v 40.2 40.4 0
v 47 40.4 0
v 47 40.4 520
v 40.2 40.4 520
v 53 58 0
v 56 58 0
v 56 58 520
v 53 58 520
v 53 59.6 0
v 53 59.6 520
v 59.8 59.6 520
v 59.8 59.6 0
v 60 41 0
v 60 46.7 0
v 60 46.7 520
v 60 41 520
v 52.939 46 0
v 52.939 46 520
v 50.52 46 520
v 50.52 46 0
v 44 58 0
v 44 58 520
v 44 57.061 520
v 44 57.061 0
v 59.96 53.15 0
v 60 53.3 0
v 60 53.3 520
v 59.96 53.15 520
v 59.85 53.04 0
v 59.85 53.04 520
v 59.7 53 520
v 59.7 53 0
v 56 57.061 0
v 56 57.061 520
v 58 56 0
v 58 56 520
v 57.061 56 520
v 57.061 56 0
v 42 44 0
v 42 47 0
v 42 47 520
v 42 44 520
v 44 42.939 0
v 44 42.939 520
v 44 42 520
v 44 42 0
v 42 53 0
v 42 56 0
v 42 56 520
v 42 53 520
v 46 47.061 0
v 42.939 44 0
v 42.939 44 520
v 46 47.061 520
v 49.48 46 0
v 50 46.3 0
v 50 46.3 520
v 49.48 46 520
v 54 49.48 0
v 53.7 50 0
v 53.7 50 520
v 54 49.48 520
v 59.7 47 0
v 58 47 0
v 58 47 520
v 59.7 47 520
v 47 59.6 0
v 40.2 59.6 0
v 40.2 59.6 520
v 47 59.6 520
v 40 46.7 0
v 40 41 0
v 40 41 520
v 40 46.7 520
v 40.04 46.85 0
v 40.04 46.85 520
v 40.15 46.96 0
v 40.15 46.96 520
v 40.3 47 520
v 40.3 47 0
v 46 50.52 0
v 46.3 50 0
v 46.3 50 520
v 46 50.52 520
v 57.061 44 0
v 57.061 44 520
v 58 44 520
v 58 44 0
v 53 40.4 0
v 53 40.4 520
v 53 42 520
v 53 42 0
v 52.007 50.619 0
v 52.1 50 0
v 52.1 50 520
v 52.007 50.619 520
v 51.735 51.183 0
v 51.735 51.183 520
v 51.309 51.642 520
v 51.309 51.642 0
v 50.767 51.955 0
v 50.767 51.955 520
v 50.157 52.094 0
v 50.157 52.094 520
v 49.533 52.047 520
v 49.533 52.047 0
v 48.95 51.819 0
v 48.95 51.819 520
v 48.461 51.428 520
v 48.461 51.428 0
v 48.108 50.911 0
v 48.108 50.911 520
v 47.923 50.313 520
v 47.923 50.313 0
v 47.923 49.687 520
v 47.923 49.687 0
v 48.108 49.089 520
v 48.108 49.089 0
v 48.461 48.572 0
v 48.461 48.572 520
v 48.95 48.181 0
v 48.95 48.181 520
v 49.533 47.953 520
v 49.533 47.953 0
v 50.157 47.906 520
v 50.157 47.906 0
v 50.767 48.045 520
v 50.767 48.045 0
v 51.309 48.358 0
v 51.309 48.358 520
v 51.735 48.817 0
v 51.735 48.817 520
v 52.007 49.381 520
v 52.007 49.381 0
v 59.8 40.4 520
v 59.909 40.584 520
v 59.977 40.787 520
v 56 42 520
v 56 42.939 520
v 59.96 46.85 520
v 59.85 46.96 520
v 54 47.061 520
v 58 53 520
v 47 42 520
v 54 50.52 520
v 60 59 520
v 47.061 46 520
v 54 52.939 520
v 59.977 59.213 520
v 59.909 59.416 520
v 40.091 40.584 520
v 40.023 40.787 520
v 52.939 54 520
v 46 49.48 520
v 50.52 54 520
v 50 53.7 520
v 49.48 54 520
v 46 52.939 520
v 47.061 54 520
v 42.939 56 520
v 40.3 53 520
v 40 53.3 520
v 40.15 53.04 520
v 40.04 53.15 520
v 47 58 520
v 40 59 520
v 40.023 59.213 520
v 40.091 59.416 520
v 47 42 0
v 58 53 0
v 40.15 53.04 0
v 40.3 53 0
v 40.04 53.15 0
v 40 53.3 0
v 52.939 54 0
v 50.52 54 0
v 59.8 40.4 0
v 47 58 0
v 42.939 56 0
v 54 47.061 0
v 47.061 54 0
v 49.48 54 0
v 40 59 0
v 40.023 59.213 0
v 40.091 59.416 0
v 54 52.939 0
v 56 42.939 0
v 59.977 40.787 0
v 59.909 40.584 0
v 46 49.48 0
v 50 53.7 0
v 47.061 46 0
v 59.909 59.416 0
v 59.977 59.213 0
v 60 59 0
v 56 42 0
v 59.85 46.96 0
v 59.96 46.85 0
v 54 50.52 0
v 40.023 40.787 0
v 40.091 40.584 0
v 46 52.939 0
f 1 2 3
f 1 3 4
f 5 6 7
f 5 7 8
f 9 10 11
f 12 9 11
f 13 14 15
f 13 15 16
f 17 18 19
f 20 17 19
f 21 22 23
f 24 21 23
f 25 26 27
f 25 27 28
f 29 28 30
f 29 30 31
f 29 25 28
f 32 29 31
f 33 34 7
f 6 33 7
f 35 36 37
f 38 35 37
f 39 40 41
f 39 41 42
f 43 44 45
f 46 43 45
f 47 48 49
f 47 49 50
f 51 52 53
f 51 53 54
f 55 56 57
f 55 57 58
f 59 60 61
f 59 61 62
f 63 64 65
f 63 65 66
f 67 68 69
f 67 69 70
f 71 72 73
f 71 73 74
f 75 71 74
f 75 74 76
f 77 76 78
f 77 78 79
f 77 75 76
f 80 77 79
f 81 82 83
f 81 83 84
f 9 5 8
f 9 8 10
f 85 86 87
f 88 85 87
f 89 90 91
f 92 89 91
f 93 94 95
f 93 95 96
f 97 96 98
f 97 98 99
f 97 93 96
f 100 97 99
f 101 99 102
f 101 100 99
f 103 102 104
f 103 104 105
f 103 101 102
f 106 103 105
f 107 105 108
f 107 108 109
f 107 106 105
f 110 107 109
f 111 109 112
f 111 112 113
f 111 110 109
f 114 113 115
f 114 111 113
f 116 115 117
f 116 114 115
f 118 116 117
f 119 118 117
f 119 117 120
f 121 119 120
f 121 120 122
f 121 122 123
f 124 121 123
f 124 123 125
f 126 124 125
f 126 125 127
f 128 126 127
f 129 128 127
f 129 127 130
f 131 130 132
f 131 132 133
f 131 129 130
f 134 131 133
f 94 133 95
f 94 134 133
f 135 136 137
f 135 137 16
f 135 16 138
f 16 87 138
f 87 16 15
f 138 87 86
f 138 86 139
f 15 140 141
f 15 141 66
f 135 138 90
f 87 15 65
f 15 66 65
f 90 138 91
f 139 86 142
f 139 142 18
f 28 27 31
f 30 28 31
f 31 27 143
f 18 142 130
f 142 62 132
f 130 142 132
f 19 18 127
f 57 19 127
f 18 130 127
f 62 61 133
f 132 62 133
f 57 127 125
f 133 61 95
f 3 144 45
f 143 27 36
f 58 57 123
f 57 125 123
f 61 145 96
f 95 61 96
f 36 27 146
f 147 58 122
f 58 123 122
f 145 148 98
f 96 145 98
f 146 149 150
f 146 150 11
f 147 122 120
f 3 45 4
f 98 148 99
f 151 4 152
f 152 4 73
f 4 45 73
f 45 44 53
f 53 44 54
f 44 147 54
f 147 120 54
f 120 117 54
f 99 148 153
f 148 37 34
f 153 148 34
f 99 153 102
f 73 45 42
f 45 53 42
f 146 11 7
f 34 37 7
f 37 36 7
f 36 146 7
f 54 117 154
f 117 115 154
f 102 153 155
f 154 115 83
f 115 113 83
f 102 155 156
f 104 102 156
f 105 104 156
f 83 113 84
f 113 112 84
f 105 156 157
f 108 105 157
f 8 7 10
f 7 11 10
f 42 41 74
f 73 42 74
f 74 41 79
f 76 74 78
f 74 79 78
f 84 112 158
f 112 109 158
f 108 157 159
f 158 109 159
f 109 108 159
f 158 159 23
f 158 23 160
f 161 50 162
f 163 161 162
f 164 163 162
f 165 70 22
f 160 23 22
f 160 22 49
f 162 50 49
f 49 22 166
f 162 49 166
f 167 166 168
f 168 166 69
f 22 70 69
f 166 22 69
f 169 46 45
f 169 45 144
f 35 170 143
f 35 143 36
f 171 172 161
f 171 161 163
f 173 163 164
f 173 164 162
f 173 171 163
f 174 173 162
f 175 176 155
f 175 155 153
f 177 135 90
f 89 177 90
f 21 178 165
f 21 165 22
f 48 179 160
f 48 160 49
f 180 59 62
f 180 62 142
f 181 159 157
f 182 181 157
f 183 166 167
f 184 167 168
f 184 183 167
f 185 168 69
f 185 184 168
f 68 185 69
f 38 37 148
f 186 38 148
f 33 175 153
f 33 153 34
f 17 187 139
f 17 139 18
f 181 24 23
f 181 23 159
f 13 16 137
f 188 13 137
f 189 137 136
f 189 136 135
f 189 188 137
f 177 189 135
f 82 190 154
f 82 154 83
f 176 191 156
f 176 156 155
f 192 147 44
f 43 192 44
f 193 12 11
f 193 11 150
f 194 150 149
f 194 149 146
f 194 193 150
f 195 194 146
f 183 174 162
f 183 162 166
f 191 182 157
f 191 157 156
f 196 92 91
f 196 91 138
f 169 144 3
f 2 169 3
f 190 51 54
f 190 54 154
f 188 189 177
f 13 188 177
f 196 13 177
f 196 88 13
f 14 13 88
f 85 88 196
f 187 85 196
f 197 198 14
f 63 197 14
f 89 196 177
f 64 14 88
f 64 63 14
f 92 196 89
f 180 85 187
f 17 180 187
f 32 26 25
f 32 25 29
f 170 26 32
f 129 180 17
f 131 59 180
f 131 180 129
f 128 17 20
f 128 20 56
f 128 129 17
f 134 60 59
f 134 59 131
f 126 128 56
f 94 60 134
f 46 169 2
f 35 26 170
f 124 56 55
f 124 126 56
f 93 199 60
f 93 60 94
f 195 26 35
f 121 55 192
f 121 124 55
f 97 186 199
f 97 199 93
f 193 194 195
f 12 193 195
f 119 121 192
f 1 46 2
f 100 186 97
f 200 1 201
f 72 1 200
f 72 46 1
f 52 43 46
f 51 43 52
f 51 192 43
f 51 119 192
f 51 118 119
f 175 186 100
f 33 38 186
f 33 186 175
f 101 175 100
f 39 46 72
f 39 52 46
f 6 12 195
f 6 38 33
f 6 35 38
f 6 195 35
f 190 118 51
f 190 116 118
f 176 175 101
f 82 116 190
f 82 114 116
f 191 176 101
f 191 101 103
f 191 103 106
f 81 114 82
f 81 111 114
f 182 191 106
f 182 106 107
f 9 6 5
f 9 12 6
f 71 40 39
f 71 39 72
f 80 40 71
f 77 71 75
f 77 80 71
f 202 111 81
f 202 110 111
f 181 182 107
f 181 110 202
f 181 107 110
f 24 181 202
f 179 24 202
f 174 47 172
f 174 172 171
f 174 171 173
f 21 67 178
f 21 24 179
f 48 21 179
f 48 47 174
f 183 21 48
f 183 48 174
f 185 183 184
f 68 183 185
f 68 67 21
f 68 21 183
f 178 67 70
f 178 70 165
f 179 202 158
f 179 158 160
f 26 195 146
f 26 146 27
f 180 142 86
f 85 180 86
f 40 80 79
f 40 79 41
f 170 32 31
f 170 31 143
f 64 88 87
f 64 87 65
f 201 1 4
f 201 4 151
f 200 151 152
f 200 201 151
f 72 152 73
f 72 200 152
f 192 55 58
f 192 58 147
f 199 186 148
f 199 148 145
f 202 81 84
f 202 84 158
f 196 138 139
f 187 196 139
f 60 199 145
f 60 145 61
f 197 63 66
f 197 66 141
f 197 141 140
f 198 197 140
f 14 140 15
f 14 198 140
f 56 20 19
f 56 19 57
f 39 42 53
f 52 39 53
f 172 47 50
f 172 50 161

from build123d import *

# Parameters (mm, degrees)
SKETCH_3_R      = 2.0999999
EXTRUDE_1_DEPTH = 520


with BuildPart() as part:
    # 草图3 → 凸台-拉伸1 (new body)
    with BuildSketch(Plane.XY):
        with BuildLine():
            Line((57.060659494, 56.000000011), (54.000002413, 52.939342929))
            Line((54.000002413, 52.939342929), (54.000002413, 50.519633796))
            Line((54.000002413, 50.519633796), (53.700020897, 50.000006546))
            Line((53.700020897, 50.000006546), (54.000002413, 49.480359881))
            Line((54.000002413, 49.480359881), (54.000002413, 47.060657071))
            Line((54.000002413, 47.060657071), (57.060659494, 43.999999989))
            Line((57.060659494, 43.999999989), (57.999999993, 43.999999989))
            Line((57.999999993, 43.999999989), (57.999999993, 46.999999994))
            Line((57.999999993, 46.999999994), (59.699999997, 46.999999994))
            ThreePointArc((59.699999997, 46.999999994), (59.912132029, 46.912132029), (59.999999993, 46.699999998))
            Line((59.999999993, 46.699999998), (59.999999993, 41))
            ThreePointArc((59.999999993, 41), (59.948683291, 40.683772234), (59.799999994, 40.400000001))
            Line((59.799999994, 40.400000001), (52.999999994, 40.400000001))
            Line((52.999999994, 40.400000001), (52.999999994, 42))
            Line((52.999999994, 42), (55.999999999, 42))
            Line((55.999999999, 42), (55.999999999, 42.939340499))
            Line((55.999999999, 42.939340499), (52.939327623, 45.999997582))
            Line((52.939327623, 45.999997582), (50.519608524, 45.999997582))
            Line((50.519608524, 45.999997582), (49.99999391, 46.300000984))
            Line((49.99999391, 46.300000984), (49.48035988, 45.999997582))
            Line((49.48035988, 45.999997582), (47.06065707, 45.999997582))
            Line((47.06065707, 45.999997582), (43.99999999, 42.939340499))
            Line((43.99999999, 42.939340499), (43.99999999, 42))
            Line((43.99999999, 42), (46.999999994, 42))
            Line((46.999999994, 42), (46.999999994, 40.400000001))
            Line((46.999999994, 40.400000001), (40.199999995, 40.400000001))
            ThreePointArc((40.199999995, 40.400000001), (40.051316697, 40.683772234), (39.999999996, 41))
            Line((39.999999996, 41), (39.999999996, 46.699999998))
            ThreePointArc((39.999999996, 46.699999998), (40.08786796, 46.912132029), (40.299999991, 46.999999994))
            Line((40.299999991, 46.999999994), (41.999999996, 46.999999994))
            Line((41.999999996, 46.999999994), (41.999999996, 43.999999989))
            Line((41.999999996, 43.999999989), (42.939340495, 43.999999989))
            Line((42.939340495, 43.999999989), (45.999997575, 47.060657071))
            Line((45.999997575, 47.060657071), (45.999997575, 49.480366204))
            Line((45.999997575, 49.480366204), (46.300000986, 49.999980814))
            Line((46.300000986, 49.999980814), (45.999997575, 50.519614839))
            Line((45.999997575, 50.519614839), (45.999997575, 52.939323971))
            Line((45.999997575, 52.939323971), (42.939315735, 56.000000011))
            Line((42.939315735, 56.000000011), (41.999999996, 56.000000011))
            Line((41.999999996, 56.000000011), (41.999999996, 53.000000007))
            Line((41.999999996, 53.000000007), (40.299999991, 53.000000007))
            ThreePointArc((40.299999991, 53.000000007), (40.08786796, 53.087867971), (39.999999996, 53.300000003))
            Line((39.999999996, 53.300000003), (39.999999996, 59))
            ThreePointArc((39.999999996, 59), (40.051316697, 59.316227766), (40.199999995, 59.6))
            Line((40.199999995, 59.6), (46.999999994, 59.6))
            Line((46.999999994, 59.6), (46.999999994, 58))
            Line((46.999999994, 58), (43.99999999, 58))
            Line((43.99999999, 58), (43.99999999, 57.060659501))
            Line((43.99999999, 57.060659501), (47.060664718, 53.999994771))
            Line((47.060664718, 53.999994771), (49.480367527, 53.999994771))
            Line((49.480367527, 53.999994771), (49.999987125, 53.7))
            Line((49.999987125, 53.7), (50.519626138, 53.999994771))
            Line((50.519626138, 53.999994771), (52.939335271, 53.999994771))
            Line((52.939335271, 53.999994771), (55.999999999, 57.060659501))
            Line((55.999999999, 57.060659501), (55.999999999, 58))
            Line((55.999999999, 58), (52.999999994, 58))
            Line((52.999999994, 58), (52.999999994, 59.6))
            Line((52.999999994, 59.6), (59.799999994, 59.6))
            ThreePointArc((59.799999994, 59.6), (59.948683291, 59.316227766), (59.999999993, 59))
            Line((59.999999993, 59), (59.999999993, 53.300000003))
            ThreePointArc((59.999999993, 53.300000003), (59.912132029, 53.087867971), (59.699999997, 53.000000007))
            Line((59.699999997, 53.000000007), (57.999999993, 53.000000007))
            Line((57.999999993, 53.000000007), (57.999999993, 56.000000011))
            Line((57.999999993, 56.000000011), (57.060659494, 56.000000011))
        make_face()
        with Locations((50, 50)):
            Circle(SKETCH_3_R, mode=Mode.SUBTRACT)
    extrude(amount=EXTRUDE_1_DEPTH)


solid = part.part
